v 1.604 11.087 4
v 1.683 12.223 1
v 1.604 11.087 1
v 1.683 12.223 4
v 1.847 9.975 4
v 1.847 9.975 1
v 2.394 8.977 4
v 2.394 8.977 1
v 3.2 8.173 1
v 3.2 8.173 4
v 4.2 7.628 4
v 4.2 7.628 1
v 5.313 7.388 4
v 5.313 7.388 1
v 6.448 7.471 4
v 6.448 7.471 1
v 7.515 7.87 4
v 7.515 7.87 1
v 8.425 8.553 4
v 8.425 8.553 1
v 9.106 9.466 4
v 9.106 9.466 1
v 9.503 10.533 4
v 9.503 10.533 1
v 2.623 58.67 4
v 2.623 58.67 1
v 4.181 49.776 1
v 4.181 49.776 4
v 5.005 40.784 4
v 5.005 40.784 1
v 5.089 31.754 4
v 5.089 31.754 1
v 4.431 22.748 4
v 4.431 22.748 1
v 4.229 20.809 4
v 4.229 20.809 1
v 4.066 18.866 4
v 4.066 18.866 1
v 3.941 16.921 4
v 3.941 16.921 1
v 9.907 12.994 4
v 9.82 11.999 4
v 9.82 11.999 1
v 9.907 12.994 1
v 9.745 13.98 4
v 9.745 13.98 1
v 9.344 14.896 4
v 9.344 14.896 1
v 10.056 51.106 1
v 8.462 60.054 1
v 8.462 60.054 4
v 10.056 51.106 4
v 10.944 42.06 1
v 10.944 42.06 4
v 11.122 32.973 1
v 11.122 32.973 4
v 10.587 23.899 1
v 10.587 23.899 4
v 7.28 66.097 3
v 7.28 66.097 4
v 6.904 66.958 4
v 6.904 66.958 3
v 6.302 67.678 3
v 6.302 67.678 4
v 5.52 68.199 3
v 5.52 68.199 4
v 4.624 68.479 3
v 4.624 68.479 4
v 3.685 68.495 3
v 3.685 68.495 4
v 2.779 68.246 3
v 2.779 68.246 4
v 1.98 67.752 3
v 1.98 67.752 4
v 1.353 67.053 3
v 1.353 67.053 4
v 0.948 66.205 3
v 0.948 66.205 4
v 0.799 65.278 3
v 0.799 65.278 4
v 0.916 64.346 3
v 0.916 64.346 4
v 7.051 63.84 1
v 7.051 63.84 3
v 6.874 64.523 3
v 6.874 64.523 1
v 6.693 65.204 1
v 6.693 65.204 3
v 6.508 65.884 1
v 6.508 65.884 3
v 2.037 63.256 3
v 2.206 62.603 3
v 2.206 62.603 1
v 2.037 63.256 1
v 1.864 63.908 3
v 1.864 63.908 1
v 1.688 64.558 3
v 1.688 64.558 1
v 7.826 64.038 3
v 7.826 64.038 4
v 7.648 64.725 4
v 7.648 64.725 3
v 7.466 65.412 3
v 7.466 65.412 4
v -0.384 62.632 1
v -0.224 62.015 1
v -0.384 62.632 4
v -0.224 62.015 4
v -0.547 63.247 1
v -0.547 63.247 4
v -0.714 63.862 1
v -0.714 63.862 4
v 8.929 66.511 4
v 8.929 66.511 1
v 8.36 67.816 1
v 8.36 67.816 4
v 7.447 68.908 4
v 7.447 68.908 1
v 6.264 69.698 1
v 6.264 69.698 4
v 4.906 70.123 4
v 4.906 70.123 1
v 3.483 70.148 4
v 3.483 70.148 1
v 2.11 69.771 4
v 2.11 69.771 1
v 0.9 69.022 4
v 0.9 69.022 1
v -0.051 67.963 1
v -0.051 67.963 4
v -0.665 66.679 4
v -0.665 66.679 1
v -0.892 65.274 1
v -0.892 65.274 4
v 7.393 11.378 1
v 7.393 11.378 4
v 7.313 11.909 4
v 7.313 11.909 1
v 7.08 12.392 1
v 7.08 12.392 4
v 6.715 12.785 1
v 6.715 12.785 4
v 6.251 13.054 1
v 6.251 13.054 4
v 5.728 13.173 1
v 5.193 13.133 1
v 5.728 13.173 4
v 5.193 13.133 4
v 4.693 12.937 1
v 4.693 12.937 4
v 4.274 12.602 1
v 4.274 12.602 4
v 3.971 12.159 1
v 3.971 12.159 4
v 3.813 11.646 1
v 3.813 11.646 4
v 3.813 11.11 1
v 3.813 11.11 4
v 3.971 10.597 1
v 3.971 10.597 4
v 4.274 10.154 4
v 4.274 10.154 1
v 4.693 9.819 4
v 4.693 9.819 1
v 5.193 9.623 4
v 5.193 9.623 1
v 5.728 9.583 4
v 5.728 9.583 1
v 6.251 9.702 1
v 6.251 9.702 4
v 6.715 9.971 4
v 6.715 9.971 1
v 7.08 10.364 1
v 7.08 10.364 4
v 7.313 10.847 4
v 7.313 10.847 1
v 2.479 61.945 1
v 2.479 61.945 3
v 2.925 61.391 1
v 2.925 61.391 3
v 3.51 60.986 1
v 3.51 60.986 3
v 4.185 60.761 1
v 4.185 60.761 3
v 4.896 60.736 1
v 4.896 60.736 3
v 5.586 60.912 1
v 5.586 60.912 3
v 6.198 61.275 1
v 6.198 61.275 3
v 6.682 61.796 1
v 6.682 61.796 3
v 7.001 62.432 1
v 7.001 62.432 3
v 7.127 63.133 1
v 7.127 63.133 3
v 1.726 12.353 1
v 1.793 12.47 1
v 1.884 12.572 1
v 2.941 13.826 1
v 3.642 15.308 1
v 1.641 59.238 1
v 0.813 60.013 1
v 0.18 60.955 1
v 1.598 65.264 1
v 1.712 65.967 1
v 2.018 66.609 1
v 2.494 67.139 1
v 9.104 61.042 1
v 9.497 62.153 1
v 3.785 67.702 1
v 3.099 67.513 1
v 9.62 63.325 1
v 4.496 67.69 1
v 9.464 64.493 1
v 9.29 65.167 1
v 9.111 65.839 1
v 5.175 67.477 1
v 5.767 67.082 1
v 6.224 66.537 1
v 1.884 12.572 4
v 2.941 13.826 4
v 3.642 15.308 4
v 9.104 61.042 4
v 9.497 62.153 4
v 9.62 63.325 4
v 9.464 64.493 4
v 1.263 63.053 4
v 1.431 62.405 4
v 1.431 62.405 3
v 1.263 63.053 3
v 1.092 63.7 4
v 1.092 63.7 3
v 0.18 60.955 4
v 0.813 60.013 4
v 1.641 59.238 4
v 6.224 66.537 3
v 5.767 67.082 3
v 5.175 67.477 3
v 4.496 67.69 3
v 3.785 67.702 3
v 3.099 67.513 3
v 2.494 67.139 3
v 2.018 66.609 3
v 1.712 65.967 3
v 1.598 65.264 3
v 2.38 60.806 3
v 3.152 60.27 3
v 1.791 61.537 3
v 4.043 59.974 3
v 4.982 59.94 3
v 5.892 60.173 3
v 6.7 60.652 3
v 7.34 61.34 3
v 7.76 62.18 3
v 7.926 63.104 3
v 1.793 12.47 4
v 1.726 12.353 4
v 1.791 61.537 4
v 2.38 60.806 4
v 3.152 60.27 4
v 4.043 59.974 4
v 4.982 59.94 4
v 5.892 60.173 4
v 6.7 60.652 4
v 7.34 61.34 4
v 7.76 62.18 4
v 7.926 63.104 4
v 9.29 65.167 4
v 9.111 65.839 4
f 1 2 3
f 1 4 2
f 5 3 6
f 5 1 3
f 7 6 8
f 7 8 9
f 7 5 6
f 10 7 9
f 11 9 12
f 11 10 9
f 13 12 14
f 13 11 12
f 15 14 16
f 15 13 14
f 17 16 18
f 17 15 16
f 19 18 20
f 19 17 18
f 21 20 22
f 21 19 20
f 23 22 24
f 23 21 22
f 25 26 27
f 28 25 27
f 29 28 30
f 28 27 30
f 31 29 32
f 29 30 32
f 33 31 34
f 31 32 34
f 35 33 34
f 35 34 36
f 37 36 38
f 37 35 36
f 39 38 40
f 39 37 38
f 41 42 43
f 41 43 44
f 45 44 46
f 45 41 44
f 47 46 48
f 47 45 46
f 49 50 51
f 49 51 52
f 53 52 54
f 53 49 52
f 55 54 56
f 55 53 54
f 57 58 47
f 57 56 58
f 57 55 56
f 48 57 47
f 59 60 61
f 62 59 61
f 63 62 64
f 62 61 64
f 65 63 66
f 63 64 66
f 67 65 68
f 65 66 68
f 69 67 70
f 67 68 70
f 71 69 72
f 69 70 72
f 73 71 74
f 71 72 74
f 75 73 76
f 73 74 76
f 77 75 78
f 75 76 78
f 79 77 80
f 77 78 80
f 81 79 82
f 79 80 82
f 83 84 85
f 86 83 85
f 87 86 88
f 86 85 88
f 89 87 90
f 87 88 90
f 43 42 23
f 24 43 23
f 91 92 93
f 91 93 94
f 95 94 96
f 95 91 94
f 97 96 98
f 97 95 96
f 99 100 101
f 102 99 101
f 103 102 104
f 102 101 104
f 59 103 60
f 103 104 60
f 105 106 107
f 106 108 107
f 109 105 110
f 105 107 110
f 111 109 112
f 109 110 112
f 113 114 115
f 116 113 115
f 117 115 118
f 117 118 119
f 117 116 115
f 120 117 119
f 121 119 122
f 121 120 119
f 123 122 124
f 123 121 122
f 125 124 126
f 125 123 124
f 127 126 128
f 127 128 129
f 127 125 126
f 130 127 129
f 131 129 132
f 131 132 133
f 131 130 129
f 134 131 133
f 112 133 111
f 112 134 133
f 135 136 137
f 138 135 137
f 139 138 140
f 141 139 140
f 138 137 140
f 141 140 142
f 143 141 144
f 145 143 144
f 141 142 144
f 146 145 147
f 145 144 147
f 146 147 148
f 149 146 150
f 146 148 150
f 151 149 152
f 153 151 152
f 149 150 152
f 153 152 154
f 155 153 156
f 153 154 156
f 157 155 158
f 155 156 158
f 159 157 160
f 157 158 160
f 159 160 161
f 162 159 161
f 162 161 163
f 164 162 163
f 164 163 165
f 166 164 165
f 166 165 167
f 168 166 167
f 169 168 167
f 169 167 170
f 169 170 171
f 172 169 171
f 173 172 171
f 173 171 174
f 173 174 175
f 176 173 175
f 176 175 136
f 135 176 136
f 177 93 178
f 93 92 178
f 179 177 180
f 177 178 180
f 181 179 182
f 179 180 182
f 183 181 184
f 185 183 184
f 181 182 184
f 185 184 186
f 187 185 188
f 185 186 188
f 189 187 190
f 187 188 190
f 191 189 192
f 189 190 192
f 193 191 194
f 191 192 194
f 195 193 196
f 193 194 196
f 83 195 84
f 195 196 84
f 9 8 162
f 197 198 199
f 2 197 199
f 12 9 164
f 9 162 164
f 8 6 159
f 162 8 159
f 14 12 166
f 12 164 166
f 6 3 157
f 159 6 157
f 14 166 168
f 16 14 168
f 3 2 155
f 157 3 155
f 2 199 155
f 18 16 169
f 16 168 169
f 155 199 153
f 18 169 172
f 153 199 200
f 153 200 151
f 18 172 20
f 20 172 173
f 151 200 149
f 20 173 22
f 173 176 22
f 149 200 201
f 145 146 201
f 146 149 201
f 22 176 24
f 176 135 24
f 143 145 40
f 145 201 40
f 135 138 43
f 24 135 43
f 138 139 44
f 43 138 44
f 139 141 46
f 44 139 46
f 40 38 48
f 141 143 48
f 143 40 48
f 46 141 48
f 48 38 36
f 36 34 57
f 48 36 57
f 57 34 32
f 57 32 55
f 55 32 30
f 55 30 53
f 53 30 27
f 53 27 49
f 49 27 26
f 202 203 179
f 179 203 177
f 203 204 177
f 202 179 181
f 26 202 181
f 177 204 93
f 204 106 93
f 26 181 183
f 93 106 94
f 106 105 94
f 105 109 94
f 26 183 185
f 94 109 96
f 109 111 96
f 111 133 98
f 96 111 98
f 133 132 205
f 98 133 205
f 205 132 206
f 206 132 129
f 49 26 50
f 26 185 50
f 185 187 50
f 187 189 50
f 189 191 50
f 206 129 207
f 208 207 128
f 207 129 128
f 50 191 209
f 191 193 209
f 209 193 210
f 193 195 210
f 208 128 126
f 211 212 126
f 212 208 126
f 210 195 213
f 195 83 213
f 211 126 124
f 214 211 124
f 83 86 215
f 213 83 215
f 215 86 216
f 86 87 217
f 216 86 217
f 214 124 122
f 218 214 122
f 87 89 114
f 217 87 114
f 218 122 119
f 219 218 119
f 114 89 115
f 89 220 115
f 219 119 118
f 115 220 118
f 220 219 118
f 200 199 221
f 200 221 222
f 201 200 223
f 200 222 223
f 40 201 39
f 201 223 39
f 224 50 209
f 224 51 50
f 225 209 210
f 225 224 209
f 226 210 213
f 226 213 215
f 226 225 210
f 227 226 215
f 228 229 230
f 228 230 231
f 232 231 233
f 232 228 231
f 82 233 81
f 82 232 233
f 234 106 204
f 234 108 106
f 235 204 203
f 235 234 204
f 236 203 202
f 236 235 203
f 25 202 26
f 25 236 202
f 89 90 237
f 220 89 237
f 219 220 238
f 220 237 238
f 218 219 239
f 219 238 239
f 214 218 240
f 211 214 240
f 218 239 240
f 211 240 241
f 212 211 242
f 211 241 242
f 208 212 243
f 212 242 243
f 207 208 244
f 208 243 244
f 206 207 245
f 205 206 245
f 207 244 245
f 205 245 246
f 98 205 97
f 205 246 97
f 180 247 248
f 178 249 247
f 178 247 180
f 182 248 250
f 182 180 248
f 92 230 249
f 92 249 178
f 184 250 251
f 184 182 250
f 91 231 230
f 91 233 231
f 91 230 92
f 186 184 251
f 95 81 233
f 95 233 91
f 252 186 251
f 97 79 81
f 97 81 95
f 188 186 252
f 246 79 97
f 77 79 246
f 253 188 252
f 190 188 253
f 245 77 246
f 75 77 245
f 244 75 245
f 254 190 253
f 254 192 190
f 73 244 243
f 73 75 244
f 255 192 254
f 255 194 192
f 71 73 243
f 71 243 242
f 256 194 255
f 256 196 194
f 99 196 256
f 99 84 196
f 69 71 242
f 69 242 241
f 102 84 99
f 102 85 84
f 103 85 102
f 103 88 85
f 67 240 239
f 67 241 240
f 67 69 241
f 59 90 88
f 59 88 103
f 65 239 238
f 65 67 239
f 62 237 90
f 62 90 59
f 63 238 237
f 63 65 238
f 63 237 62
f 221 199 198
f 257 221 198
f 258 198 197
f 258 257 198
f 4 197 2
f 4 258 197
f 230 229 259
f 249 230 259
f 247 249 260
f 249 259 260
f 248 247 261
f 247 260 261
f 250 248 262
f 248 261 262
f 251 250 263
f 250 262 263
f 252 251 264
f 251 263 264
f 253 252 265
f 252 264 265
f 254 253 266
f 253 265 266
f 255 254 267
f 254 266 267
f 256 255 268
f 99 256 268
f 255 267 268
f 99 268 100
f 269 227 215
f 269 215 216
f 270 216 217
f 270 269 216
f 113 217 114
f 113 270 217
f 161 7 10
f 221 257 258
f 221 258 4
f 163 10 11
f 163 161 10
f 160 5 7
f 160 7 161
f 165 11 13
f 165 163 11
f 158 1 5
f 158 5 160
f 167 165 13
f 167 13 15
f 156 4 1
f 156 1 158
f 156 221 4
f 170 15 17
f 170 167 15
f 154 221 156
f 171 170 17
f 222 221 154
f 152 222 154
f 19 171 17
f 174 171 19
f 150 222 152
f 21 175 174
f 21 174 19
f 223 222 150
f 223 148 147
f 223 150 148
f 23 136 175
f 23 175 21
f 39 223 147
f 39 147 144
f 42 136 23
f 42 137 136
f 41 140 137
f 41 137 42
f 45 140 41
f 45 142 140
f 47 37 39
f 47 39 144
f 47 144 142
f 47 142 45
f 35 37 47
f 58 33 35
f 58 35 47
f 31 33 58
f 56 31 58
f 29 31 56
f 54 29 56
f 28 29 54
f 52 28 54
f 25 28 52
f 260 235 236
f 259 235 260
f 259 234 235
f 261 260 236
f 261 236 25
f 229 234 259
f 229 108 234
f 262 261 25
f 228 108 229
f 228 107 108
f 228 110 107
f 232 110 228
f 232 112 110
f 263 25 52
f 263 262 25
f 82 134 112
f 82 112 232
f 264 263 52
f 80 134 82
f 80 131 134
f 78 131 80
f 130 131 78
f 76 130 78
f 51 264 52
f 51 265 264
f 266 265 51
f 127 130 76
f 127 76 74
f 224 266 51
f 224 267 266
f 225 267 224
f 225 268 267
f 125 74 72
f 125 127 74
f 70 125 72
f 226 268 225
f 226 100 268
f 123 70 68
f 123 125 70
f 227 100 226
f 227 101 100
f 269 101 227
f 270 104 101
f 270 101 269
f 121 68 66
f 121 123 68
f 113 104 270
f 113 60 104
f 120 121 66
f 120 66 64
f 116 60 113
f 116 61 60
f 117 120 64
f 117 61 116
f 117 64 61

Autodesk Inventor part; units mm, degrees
ref_plane "Work Plane1" through (-0.0405, 69.8618, 0) normal (0, 0, 1) x (0.6413599, 0.7672402, 0)
ref_plane "Work Plane3" through (5.5931, 11.378, 1) normal (0, 0, 1) x (1, 0, 0)
sketch "Sketch2" plane through (5.5931, 11.378, 1) normal (0, 0, 1) x (1, 0, 0)
  arc A0 (-2.9323, 0.6339) -> (-4.1247, 52.0744) centre (-110.4489, 23.8756) ccw projected
  arc A1 (2.9323, -0.6339) -> (1.6748, 53.6125) centre (-110.4489, 23.8756) ccw projected
  arc A2 (1.6748, 53.6125) -> (-4.1247, 52.0744) centre (-1.225, 52.8435) ccw projected
  circle A3 centre (0, 0) radius 3 projected
  circle A4 centre (0, 0) radius 1.25 projected
  circle A5 centre (-1.225, 52.8435) radius 3 projected
  circle A6 centre (-1.225, 52.8435) radius 1.4795 projected
  point P0 (-5.5931, -11.378)
  point P1 (-2.9323, 0.6339)
  point P2 (2.9323, -0.6339)
extrude "Extrusion2" add sketch "Sketch2" along normal blind 3
ref_plane "Work Plane6" through (4.3681, 64.2214, 5) normal (0, 0, 1) x (1, 0, 0)
sketch "Sketch4" plane through (4.3681, 64.2214, 4) normal (0, 0, 1) x (1, 0, 0)
  arc A0 (4.1572, -53.4773) -> (2.8997, 0.7691) centre (-109.2239, -28.9678) ccw construction
  arc A1 (-1.7073, -52.2096) -> (-2.8997, -0.7691) centre (-109.2239, -28.9678) ccw construction
  circle A2 centre (0, 0) radius 3 construction
  circle A3 centre (0, 0) radius 3 construction
  circle A4 centre (0, 0) radius 1.4795 construction
  arc A5 (0.2521, -0.9677) -> (-0.2606, 0.9654) centre (-109.2239, -28.9678) ccw construction
  arc A6 (5.0961, 0.2712) -> (4.5608, 2.2899) centre (-109.2239, -28.9678) ccw
  arc A7 (-4.592, -2.2067) -> (-5.082, -0.359) centre (-109.2239, -28.9678) ccw
  arc A8 (-4.592, -2.2067) -> (5.0961, 0.2712) centre (0.2521, -0.9677) ccw
  arc A9 (4.5608, 2.2899) -> (-5.082, -0.359) centre (-0.2606, 0.9654) ccw
  arc A10 (-1.7073, -52.2096) -> (4.1572, -53.4773) centre (1.225, -52.8435) ccw projected
  arc A11 (2.8997, 0.7691) -> (-2.8997, -0.7691) centre (0, 0) ccw projected
  arc A12 (-1.7073, -52.2096) -> (-2.8997, -0.7691) centre (-109.2239, -28.9678) ccw projected
  point P0 (-4.3681, -64.2214)
  dimension "d16" = 10
  dimension "d26" = 1
  dimension "d27" = 1
extrude "Extrusion4" add sketch "Sketch4" against normal blind 3
ref_plane "Work Plane7" through (5.5931, 11.378, 5) normal (0, 0, 1) x (1, 0, 0)
sketch "Sketch5" plane through (5.5931, 11.378, 5) normal (0, 0, 1) x (1, 0, 0)
  arc A0 (-0.9646, 51.8435) -> (-1.4951, 53.8435) centre (-110.4489, 23.8756) ccw construction
  arc A1 (0.7309, 52.2766) -> (0.1923, 54.3076) centre (-110.4489, 23.8756) ccw
  arc A2 (-2.6602, 51.4103) -> (-3.1824, 53.3794) centre (-110.4489, 23.8756) ccw
  arc A3 (-2.6602, 51.4103) -> (0.7309, 52.2766) centre (-0.9646, 51.8435) ccw
  arc A4 (0.1923, 54.3076) -> (-3.1824, 53.3794) centre (-1.4951, 53.8435) ccw
  arc A5 (2.6687, 52.7716) -> (2.1206, 54.838) centre (-110.4489, 23.8756) ccw projected
  arc A6 (2.1206, 54.838) -> (-5.1108, 52.849) centre (-1.4951, 53.8435) ccw projected
  arc A7 (-4.598, 50.9153) -> (-5.1108, 52.849) centre (-110.4489, 23.8756) ccw projected
  arc A8 (-4.598, 50.9153) -> (2.6687, 52.7716) centre (-0.9646, 51.8435) ccw projected
  arc A9 (3.3358, 55.1334) -> (-6.307, 52.4844) centre (-1.4856, 53.8089) ccw projected
  arc A10 (3.8712, 53.1147) -> (3.3358, 55.1334) centre (-110.4489, 23.8756) ccw projected
  arc A11 (2.869, 48.6758) -> (3.8712, 53.1147) centre (-0.9729, 51.8758) ccw projected
  arc A12 (-5.817, 50.6368) -> (-2.9702, 47.292) centre (-0.9729, 51.8758) ccw projected
  arc A13 (-5.817, 50.6368) -> (-6.307, 52.4844) centre (-110.4489, 23.8756) ccw projected
  point P0 (-5.5931, -11.378)
  dimension "d12" = 3.5
extrude "Extrusion5" cut sketch "Sketch5" against normal blind 5 contours A3 A2 A4 A1
sketch "Sketch7" plane through (5.5931, 11.378, 4) normal (0, 0, 1) x (1, 0, 0)
  circle A0 centre (0, 0) radius 1.25 projected
  circle A1 centre (0, 0) radius 1.8
  arc A2 (-3.9097, 0.8452) -> (3.9097, -0.8452) centre (0, 0) ccw
  arc A3 (4.2266, 0.621) -> (-3.5928, 2.3113) centre (0.3169, 1.4661) ccw
  arc A4 (-2.9323, 0.6339) -> (-2.9702, 47.292) centre (-110.4489, 23.8756) ccw projected
  arc A5 (2.9323, -0.6339) -> (2.869, 48.6758) centre (-110.4489, 23.8756) ccw projected
  line L0 (0.3169, 1.4661) -> (0, 0) construction
  line L1 (-3.5928, 2.3113) -> (-3.9097, 0.8452)
  line L2 (4.2266, 0.621) -> (3.9097, -0.8452)
  line L3 (-2.9323, 0.6339) -> (2.9323, -0.6339) construction
  point P0 (-5.5931, -11.378)
  dimension "d19" = 3.6
  dimension "d20" = 8
  dimension "d21" = 1.5
extrude "Extrusion6" cut sketch "Sketch7" against normal up to surface (3 mm away) contours A1
extrude "Extrusion7" add sketch "Sketch7" against normal up to surface (3 mm away) contours L1 A3 L2 A2
sketch "Sketch8" plane through (5.5931, 11.378, 4) normal (0, 0, 1) x (1, 0, 0)
  arc A0 (-2.6602, 51.4103) -> (-3.1824, 53.3794) centre (-110.4489, 23.8756) ccw projected
  arc A1 (0.1923, 54.3076) -> (-3.1824, 53.3794) centre (-1.4951, 53.8435) ccw projected
  arc A2 (0.7309, 52.2766) -> (0.1923, 54.3076) centre (-110.4489, 23.8756) ccw projected
  arc A3 (-2.6602, 51.4103) -> (0.7309, 52.2766) centre (-0.9646, 51.8435) ccw projected
  arc A4 (-3.3868, 51.2247) -> (-3.9056, 53.1805) centre (-110.4489, 23.8756) ccw
  arc A5 (-3.3868, 51.2247) -> (1.4576, 52.4622) centre (-0.9646, 51.8435) ccw
  arc A6 (1.4576, 52.4622) -> (0.9154, 54.5065) centre (-110.4489, 23.8756) ccw
  arc A7 (0.9154, 54.5065) -> (-3.9056, 53.1805) centre (-1.4951, 53.8435) ccw
  arc A8 (-4.162, 51.0267) -> (-4.6769, 52.9683) centre (-110.4489, 23.8756) ccw
  arc A9 (-4.162, 51.0267) -> (2.2327, 52.6602) centre (-0.9646, 51.8435) ccw
  arc A10 (2.2327, 52.6602) -> (1.6867, 54.7186) centre (-110.4489, 23.8756) ccw
  arc A11 (1.6867, 54.7186) -> (-4.6769, 52.9683) centre (-1.4951, 53.8435) ccw
  point P0 (-5.5931, -11.378)
  dimension "d31" = 2.5
  dimension "d32" = 0.8
extrude "Extrusion8" cut sketch "Sketch8" against normal up to surface (3 mm away) contours A4 A7 A6 A5
extrude "Extrusion9" cut sketch "Sketch8" against normal blind 1 contours A8 A11 A10 A9
sketch "Sketch9" plane through (5.5931, 11.378, 4) normal (0, 0, 1) x (1, 0, 0)
  arc A0 (-3.9097, 0.8452) -> (3.9097, -0.8452) centre (0, 0) ccw projected
  arc A1 (3.7507, 3.5177) -> (2.869, 48.6758) centre (-110.4489, 23.8756) ccw projected
  arc A2 (-4.162, 51.0267) -> (-4.6769, 52.9683) centre (-110.4489, 23.8756) ccw projected
  arc A3 (1.6867, 54.7186) -> (-4.6769, 52.9683) centre (-1.4951, 53.8435) ccw projected
  arc A4 (2.2327, 52.6602) -> (1.6867, 54.7186) centre (-110.4489, 23.8756) ccw projected
  arc A5 (-4.162, 51.0267) -> (2.2327, 52.6602) centre (-0.9646, 51.8435) ccw projected
  circle A6 centre (0, 0) radius 1.8 projected
  arc A7 (3.7507, 3.5177) -> (2.869, 48.6758) centre (-110.4489, 23.8756) ccw projected
  arc A8 (2.869, 48.6758) -> (3.8712, 53.1147) centre (-0.9729, 51.8758) ccw projected
  arc A9 (3.8712, 53.1147) -> (3.3358, 55.1334) centre (-110.4489, 23.8756) ccw projected
  arc A10 (3.3358, 55.1334) -> (-6.307, 52.4844) centre (-1.4856, 53.8089) ccw projected
  arc A11 (-5.817, 50.6368) -> (-6.307, 52.4844) centre (-110.4489, 23.8756) ccw projected
  arc A12 (-5.817, 50.6368) -> (-2.9702, 47.292) centre (-0.9729, 51.8758) ccw projected
  arc A13 (-2.148, 4.6164) -> (-2.9702, 47.292) centre (-110.4489, 23.8756) ccw projected
  arc A14 (-2.148, 4.6164) -> (-3.5928, 2.3113) centre (0.3169, 1.4661) ccw projected
  line L0 (-3.5928, 2.3113) -> (-3.9097, 0.8452) projected
  arc A15 (-3.9097, 0.8452) -> (3.9097, -0.8452) centre (0, 0) ccw projected
  line L1 (3.9097, -0.8452) -> (4.2266, 0.621) projected
  arc A16 (4.2266, 0.621) -> (3.7507, 3.5177) centre (0.3169, 1.4661) ccw projected
  arc A17 (-3.7092, 1.1941) -> (-3.9097, 0.8452) centre (-3.262, 0.7051) ccw
  arc A18 (-3.7092, 1.1941) -> (-1.652, 5.5427) centre (-7.9997, 5.8848) ccw
  arc A19 (-2.148, 4.6164) -> (-2.9702, 47.292) centre (-110.4489, 23.8756) ccw projected
  arc A20 (-1.162, 11.3705) -> (-1.652, 5.5427) centre (95.5412, 0.3052) ccw
  point P0 (-5.5931, -11.378)
  point P1 (3.7507, 3.5177)
  point P2 (-1.162, 11.3705)
extrude "Extrusion10" cut sketch "Sketch9" against normal up to surface (3 mm away) contours L0 A14 A13 A20 A18 A17
